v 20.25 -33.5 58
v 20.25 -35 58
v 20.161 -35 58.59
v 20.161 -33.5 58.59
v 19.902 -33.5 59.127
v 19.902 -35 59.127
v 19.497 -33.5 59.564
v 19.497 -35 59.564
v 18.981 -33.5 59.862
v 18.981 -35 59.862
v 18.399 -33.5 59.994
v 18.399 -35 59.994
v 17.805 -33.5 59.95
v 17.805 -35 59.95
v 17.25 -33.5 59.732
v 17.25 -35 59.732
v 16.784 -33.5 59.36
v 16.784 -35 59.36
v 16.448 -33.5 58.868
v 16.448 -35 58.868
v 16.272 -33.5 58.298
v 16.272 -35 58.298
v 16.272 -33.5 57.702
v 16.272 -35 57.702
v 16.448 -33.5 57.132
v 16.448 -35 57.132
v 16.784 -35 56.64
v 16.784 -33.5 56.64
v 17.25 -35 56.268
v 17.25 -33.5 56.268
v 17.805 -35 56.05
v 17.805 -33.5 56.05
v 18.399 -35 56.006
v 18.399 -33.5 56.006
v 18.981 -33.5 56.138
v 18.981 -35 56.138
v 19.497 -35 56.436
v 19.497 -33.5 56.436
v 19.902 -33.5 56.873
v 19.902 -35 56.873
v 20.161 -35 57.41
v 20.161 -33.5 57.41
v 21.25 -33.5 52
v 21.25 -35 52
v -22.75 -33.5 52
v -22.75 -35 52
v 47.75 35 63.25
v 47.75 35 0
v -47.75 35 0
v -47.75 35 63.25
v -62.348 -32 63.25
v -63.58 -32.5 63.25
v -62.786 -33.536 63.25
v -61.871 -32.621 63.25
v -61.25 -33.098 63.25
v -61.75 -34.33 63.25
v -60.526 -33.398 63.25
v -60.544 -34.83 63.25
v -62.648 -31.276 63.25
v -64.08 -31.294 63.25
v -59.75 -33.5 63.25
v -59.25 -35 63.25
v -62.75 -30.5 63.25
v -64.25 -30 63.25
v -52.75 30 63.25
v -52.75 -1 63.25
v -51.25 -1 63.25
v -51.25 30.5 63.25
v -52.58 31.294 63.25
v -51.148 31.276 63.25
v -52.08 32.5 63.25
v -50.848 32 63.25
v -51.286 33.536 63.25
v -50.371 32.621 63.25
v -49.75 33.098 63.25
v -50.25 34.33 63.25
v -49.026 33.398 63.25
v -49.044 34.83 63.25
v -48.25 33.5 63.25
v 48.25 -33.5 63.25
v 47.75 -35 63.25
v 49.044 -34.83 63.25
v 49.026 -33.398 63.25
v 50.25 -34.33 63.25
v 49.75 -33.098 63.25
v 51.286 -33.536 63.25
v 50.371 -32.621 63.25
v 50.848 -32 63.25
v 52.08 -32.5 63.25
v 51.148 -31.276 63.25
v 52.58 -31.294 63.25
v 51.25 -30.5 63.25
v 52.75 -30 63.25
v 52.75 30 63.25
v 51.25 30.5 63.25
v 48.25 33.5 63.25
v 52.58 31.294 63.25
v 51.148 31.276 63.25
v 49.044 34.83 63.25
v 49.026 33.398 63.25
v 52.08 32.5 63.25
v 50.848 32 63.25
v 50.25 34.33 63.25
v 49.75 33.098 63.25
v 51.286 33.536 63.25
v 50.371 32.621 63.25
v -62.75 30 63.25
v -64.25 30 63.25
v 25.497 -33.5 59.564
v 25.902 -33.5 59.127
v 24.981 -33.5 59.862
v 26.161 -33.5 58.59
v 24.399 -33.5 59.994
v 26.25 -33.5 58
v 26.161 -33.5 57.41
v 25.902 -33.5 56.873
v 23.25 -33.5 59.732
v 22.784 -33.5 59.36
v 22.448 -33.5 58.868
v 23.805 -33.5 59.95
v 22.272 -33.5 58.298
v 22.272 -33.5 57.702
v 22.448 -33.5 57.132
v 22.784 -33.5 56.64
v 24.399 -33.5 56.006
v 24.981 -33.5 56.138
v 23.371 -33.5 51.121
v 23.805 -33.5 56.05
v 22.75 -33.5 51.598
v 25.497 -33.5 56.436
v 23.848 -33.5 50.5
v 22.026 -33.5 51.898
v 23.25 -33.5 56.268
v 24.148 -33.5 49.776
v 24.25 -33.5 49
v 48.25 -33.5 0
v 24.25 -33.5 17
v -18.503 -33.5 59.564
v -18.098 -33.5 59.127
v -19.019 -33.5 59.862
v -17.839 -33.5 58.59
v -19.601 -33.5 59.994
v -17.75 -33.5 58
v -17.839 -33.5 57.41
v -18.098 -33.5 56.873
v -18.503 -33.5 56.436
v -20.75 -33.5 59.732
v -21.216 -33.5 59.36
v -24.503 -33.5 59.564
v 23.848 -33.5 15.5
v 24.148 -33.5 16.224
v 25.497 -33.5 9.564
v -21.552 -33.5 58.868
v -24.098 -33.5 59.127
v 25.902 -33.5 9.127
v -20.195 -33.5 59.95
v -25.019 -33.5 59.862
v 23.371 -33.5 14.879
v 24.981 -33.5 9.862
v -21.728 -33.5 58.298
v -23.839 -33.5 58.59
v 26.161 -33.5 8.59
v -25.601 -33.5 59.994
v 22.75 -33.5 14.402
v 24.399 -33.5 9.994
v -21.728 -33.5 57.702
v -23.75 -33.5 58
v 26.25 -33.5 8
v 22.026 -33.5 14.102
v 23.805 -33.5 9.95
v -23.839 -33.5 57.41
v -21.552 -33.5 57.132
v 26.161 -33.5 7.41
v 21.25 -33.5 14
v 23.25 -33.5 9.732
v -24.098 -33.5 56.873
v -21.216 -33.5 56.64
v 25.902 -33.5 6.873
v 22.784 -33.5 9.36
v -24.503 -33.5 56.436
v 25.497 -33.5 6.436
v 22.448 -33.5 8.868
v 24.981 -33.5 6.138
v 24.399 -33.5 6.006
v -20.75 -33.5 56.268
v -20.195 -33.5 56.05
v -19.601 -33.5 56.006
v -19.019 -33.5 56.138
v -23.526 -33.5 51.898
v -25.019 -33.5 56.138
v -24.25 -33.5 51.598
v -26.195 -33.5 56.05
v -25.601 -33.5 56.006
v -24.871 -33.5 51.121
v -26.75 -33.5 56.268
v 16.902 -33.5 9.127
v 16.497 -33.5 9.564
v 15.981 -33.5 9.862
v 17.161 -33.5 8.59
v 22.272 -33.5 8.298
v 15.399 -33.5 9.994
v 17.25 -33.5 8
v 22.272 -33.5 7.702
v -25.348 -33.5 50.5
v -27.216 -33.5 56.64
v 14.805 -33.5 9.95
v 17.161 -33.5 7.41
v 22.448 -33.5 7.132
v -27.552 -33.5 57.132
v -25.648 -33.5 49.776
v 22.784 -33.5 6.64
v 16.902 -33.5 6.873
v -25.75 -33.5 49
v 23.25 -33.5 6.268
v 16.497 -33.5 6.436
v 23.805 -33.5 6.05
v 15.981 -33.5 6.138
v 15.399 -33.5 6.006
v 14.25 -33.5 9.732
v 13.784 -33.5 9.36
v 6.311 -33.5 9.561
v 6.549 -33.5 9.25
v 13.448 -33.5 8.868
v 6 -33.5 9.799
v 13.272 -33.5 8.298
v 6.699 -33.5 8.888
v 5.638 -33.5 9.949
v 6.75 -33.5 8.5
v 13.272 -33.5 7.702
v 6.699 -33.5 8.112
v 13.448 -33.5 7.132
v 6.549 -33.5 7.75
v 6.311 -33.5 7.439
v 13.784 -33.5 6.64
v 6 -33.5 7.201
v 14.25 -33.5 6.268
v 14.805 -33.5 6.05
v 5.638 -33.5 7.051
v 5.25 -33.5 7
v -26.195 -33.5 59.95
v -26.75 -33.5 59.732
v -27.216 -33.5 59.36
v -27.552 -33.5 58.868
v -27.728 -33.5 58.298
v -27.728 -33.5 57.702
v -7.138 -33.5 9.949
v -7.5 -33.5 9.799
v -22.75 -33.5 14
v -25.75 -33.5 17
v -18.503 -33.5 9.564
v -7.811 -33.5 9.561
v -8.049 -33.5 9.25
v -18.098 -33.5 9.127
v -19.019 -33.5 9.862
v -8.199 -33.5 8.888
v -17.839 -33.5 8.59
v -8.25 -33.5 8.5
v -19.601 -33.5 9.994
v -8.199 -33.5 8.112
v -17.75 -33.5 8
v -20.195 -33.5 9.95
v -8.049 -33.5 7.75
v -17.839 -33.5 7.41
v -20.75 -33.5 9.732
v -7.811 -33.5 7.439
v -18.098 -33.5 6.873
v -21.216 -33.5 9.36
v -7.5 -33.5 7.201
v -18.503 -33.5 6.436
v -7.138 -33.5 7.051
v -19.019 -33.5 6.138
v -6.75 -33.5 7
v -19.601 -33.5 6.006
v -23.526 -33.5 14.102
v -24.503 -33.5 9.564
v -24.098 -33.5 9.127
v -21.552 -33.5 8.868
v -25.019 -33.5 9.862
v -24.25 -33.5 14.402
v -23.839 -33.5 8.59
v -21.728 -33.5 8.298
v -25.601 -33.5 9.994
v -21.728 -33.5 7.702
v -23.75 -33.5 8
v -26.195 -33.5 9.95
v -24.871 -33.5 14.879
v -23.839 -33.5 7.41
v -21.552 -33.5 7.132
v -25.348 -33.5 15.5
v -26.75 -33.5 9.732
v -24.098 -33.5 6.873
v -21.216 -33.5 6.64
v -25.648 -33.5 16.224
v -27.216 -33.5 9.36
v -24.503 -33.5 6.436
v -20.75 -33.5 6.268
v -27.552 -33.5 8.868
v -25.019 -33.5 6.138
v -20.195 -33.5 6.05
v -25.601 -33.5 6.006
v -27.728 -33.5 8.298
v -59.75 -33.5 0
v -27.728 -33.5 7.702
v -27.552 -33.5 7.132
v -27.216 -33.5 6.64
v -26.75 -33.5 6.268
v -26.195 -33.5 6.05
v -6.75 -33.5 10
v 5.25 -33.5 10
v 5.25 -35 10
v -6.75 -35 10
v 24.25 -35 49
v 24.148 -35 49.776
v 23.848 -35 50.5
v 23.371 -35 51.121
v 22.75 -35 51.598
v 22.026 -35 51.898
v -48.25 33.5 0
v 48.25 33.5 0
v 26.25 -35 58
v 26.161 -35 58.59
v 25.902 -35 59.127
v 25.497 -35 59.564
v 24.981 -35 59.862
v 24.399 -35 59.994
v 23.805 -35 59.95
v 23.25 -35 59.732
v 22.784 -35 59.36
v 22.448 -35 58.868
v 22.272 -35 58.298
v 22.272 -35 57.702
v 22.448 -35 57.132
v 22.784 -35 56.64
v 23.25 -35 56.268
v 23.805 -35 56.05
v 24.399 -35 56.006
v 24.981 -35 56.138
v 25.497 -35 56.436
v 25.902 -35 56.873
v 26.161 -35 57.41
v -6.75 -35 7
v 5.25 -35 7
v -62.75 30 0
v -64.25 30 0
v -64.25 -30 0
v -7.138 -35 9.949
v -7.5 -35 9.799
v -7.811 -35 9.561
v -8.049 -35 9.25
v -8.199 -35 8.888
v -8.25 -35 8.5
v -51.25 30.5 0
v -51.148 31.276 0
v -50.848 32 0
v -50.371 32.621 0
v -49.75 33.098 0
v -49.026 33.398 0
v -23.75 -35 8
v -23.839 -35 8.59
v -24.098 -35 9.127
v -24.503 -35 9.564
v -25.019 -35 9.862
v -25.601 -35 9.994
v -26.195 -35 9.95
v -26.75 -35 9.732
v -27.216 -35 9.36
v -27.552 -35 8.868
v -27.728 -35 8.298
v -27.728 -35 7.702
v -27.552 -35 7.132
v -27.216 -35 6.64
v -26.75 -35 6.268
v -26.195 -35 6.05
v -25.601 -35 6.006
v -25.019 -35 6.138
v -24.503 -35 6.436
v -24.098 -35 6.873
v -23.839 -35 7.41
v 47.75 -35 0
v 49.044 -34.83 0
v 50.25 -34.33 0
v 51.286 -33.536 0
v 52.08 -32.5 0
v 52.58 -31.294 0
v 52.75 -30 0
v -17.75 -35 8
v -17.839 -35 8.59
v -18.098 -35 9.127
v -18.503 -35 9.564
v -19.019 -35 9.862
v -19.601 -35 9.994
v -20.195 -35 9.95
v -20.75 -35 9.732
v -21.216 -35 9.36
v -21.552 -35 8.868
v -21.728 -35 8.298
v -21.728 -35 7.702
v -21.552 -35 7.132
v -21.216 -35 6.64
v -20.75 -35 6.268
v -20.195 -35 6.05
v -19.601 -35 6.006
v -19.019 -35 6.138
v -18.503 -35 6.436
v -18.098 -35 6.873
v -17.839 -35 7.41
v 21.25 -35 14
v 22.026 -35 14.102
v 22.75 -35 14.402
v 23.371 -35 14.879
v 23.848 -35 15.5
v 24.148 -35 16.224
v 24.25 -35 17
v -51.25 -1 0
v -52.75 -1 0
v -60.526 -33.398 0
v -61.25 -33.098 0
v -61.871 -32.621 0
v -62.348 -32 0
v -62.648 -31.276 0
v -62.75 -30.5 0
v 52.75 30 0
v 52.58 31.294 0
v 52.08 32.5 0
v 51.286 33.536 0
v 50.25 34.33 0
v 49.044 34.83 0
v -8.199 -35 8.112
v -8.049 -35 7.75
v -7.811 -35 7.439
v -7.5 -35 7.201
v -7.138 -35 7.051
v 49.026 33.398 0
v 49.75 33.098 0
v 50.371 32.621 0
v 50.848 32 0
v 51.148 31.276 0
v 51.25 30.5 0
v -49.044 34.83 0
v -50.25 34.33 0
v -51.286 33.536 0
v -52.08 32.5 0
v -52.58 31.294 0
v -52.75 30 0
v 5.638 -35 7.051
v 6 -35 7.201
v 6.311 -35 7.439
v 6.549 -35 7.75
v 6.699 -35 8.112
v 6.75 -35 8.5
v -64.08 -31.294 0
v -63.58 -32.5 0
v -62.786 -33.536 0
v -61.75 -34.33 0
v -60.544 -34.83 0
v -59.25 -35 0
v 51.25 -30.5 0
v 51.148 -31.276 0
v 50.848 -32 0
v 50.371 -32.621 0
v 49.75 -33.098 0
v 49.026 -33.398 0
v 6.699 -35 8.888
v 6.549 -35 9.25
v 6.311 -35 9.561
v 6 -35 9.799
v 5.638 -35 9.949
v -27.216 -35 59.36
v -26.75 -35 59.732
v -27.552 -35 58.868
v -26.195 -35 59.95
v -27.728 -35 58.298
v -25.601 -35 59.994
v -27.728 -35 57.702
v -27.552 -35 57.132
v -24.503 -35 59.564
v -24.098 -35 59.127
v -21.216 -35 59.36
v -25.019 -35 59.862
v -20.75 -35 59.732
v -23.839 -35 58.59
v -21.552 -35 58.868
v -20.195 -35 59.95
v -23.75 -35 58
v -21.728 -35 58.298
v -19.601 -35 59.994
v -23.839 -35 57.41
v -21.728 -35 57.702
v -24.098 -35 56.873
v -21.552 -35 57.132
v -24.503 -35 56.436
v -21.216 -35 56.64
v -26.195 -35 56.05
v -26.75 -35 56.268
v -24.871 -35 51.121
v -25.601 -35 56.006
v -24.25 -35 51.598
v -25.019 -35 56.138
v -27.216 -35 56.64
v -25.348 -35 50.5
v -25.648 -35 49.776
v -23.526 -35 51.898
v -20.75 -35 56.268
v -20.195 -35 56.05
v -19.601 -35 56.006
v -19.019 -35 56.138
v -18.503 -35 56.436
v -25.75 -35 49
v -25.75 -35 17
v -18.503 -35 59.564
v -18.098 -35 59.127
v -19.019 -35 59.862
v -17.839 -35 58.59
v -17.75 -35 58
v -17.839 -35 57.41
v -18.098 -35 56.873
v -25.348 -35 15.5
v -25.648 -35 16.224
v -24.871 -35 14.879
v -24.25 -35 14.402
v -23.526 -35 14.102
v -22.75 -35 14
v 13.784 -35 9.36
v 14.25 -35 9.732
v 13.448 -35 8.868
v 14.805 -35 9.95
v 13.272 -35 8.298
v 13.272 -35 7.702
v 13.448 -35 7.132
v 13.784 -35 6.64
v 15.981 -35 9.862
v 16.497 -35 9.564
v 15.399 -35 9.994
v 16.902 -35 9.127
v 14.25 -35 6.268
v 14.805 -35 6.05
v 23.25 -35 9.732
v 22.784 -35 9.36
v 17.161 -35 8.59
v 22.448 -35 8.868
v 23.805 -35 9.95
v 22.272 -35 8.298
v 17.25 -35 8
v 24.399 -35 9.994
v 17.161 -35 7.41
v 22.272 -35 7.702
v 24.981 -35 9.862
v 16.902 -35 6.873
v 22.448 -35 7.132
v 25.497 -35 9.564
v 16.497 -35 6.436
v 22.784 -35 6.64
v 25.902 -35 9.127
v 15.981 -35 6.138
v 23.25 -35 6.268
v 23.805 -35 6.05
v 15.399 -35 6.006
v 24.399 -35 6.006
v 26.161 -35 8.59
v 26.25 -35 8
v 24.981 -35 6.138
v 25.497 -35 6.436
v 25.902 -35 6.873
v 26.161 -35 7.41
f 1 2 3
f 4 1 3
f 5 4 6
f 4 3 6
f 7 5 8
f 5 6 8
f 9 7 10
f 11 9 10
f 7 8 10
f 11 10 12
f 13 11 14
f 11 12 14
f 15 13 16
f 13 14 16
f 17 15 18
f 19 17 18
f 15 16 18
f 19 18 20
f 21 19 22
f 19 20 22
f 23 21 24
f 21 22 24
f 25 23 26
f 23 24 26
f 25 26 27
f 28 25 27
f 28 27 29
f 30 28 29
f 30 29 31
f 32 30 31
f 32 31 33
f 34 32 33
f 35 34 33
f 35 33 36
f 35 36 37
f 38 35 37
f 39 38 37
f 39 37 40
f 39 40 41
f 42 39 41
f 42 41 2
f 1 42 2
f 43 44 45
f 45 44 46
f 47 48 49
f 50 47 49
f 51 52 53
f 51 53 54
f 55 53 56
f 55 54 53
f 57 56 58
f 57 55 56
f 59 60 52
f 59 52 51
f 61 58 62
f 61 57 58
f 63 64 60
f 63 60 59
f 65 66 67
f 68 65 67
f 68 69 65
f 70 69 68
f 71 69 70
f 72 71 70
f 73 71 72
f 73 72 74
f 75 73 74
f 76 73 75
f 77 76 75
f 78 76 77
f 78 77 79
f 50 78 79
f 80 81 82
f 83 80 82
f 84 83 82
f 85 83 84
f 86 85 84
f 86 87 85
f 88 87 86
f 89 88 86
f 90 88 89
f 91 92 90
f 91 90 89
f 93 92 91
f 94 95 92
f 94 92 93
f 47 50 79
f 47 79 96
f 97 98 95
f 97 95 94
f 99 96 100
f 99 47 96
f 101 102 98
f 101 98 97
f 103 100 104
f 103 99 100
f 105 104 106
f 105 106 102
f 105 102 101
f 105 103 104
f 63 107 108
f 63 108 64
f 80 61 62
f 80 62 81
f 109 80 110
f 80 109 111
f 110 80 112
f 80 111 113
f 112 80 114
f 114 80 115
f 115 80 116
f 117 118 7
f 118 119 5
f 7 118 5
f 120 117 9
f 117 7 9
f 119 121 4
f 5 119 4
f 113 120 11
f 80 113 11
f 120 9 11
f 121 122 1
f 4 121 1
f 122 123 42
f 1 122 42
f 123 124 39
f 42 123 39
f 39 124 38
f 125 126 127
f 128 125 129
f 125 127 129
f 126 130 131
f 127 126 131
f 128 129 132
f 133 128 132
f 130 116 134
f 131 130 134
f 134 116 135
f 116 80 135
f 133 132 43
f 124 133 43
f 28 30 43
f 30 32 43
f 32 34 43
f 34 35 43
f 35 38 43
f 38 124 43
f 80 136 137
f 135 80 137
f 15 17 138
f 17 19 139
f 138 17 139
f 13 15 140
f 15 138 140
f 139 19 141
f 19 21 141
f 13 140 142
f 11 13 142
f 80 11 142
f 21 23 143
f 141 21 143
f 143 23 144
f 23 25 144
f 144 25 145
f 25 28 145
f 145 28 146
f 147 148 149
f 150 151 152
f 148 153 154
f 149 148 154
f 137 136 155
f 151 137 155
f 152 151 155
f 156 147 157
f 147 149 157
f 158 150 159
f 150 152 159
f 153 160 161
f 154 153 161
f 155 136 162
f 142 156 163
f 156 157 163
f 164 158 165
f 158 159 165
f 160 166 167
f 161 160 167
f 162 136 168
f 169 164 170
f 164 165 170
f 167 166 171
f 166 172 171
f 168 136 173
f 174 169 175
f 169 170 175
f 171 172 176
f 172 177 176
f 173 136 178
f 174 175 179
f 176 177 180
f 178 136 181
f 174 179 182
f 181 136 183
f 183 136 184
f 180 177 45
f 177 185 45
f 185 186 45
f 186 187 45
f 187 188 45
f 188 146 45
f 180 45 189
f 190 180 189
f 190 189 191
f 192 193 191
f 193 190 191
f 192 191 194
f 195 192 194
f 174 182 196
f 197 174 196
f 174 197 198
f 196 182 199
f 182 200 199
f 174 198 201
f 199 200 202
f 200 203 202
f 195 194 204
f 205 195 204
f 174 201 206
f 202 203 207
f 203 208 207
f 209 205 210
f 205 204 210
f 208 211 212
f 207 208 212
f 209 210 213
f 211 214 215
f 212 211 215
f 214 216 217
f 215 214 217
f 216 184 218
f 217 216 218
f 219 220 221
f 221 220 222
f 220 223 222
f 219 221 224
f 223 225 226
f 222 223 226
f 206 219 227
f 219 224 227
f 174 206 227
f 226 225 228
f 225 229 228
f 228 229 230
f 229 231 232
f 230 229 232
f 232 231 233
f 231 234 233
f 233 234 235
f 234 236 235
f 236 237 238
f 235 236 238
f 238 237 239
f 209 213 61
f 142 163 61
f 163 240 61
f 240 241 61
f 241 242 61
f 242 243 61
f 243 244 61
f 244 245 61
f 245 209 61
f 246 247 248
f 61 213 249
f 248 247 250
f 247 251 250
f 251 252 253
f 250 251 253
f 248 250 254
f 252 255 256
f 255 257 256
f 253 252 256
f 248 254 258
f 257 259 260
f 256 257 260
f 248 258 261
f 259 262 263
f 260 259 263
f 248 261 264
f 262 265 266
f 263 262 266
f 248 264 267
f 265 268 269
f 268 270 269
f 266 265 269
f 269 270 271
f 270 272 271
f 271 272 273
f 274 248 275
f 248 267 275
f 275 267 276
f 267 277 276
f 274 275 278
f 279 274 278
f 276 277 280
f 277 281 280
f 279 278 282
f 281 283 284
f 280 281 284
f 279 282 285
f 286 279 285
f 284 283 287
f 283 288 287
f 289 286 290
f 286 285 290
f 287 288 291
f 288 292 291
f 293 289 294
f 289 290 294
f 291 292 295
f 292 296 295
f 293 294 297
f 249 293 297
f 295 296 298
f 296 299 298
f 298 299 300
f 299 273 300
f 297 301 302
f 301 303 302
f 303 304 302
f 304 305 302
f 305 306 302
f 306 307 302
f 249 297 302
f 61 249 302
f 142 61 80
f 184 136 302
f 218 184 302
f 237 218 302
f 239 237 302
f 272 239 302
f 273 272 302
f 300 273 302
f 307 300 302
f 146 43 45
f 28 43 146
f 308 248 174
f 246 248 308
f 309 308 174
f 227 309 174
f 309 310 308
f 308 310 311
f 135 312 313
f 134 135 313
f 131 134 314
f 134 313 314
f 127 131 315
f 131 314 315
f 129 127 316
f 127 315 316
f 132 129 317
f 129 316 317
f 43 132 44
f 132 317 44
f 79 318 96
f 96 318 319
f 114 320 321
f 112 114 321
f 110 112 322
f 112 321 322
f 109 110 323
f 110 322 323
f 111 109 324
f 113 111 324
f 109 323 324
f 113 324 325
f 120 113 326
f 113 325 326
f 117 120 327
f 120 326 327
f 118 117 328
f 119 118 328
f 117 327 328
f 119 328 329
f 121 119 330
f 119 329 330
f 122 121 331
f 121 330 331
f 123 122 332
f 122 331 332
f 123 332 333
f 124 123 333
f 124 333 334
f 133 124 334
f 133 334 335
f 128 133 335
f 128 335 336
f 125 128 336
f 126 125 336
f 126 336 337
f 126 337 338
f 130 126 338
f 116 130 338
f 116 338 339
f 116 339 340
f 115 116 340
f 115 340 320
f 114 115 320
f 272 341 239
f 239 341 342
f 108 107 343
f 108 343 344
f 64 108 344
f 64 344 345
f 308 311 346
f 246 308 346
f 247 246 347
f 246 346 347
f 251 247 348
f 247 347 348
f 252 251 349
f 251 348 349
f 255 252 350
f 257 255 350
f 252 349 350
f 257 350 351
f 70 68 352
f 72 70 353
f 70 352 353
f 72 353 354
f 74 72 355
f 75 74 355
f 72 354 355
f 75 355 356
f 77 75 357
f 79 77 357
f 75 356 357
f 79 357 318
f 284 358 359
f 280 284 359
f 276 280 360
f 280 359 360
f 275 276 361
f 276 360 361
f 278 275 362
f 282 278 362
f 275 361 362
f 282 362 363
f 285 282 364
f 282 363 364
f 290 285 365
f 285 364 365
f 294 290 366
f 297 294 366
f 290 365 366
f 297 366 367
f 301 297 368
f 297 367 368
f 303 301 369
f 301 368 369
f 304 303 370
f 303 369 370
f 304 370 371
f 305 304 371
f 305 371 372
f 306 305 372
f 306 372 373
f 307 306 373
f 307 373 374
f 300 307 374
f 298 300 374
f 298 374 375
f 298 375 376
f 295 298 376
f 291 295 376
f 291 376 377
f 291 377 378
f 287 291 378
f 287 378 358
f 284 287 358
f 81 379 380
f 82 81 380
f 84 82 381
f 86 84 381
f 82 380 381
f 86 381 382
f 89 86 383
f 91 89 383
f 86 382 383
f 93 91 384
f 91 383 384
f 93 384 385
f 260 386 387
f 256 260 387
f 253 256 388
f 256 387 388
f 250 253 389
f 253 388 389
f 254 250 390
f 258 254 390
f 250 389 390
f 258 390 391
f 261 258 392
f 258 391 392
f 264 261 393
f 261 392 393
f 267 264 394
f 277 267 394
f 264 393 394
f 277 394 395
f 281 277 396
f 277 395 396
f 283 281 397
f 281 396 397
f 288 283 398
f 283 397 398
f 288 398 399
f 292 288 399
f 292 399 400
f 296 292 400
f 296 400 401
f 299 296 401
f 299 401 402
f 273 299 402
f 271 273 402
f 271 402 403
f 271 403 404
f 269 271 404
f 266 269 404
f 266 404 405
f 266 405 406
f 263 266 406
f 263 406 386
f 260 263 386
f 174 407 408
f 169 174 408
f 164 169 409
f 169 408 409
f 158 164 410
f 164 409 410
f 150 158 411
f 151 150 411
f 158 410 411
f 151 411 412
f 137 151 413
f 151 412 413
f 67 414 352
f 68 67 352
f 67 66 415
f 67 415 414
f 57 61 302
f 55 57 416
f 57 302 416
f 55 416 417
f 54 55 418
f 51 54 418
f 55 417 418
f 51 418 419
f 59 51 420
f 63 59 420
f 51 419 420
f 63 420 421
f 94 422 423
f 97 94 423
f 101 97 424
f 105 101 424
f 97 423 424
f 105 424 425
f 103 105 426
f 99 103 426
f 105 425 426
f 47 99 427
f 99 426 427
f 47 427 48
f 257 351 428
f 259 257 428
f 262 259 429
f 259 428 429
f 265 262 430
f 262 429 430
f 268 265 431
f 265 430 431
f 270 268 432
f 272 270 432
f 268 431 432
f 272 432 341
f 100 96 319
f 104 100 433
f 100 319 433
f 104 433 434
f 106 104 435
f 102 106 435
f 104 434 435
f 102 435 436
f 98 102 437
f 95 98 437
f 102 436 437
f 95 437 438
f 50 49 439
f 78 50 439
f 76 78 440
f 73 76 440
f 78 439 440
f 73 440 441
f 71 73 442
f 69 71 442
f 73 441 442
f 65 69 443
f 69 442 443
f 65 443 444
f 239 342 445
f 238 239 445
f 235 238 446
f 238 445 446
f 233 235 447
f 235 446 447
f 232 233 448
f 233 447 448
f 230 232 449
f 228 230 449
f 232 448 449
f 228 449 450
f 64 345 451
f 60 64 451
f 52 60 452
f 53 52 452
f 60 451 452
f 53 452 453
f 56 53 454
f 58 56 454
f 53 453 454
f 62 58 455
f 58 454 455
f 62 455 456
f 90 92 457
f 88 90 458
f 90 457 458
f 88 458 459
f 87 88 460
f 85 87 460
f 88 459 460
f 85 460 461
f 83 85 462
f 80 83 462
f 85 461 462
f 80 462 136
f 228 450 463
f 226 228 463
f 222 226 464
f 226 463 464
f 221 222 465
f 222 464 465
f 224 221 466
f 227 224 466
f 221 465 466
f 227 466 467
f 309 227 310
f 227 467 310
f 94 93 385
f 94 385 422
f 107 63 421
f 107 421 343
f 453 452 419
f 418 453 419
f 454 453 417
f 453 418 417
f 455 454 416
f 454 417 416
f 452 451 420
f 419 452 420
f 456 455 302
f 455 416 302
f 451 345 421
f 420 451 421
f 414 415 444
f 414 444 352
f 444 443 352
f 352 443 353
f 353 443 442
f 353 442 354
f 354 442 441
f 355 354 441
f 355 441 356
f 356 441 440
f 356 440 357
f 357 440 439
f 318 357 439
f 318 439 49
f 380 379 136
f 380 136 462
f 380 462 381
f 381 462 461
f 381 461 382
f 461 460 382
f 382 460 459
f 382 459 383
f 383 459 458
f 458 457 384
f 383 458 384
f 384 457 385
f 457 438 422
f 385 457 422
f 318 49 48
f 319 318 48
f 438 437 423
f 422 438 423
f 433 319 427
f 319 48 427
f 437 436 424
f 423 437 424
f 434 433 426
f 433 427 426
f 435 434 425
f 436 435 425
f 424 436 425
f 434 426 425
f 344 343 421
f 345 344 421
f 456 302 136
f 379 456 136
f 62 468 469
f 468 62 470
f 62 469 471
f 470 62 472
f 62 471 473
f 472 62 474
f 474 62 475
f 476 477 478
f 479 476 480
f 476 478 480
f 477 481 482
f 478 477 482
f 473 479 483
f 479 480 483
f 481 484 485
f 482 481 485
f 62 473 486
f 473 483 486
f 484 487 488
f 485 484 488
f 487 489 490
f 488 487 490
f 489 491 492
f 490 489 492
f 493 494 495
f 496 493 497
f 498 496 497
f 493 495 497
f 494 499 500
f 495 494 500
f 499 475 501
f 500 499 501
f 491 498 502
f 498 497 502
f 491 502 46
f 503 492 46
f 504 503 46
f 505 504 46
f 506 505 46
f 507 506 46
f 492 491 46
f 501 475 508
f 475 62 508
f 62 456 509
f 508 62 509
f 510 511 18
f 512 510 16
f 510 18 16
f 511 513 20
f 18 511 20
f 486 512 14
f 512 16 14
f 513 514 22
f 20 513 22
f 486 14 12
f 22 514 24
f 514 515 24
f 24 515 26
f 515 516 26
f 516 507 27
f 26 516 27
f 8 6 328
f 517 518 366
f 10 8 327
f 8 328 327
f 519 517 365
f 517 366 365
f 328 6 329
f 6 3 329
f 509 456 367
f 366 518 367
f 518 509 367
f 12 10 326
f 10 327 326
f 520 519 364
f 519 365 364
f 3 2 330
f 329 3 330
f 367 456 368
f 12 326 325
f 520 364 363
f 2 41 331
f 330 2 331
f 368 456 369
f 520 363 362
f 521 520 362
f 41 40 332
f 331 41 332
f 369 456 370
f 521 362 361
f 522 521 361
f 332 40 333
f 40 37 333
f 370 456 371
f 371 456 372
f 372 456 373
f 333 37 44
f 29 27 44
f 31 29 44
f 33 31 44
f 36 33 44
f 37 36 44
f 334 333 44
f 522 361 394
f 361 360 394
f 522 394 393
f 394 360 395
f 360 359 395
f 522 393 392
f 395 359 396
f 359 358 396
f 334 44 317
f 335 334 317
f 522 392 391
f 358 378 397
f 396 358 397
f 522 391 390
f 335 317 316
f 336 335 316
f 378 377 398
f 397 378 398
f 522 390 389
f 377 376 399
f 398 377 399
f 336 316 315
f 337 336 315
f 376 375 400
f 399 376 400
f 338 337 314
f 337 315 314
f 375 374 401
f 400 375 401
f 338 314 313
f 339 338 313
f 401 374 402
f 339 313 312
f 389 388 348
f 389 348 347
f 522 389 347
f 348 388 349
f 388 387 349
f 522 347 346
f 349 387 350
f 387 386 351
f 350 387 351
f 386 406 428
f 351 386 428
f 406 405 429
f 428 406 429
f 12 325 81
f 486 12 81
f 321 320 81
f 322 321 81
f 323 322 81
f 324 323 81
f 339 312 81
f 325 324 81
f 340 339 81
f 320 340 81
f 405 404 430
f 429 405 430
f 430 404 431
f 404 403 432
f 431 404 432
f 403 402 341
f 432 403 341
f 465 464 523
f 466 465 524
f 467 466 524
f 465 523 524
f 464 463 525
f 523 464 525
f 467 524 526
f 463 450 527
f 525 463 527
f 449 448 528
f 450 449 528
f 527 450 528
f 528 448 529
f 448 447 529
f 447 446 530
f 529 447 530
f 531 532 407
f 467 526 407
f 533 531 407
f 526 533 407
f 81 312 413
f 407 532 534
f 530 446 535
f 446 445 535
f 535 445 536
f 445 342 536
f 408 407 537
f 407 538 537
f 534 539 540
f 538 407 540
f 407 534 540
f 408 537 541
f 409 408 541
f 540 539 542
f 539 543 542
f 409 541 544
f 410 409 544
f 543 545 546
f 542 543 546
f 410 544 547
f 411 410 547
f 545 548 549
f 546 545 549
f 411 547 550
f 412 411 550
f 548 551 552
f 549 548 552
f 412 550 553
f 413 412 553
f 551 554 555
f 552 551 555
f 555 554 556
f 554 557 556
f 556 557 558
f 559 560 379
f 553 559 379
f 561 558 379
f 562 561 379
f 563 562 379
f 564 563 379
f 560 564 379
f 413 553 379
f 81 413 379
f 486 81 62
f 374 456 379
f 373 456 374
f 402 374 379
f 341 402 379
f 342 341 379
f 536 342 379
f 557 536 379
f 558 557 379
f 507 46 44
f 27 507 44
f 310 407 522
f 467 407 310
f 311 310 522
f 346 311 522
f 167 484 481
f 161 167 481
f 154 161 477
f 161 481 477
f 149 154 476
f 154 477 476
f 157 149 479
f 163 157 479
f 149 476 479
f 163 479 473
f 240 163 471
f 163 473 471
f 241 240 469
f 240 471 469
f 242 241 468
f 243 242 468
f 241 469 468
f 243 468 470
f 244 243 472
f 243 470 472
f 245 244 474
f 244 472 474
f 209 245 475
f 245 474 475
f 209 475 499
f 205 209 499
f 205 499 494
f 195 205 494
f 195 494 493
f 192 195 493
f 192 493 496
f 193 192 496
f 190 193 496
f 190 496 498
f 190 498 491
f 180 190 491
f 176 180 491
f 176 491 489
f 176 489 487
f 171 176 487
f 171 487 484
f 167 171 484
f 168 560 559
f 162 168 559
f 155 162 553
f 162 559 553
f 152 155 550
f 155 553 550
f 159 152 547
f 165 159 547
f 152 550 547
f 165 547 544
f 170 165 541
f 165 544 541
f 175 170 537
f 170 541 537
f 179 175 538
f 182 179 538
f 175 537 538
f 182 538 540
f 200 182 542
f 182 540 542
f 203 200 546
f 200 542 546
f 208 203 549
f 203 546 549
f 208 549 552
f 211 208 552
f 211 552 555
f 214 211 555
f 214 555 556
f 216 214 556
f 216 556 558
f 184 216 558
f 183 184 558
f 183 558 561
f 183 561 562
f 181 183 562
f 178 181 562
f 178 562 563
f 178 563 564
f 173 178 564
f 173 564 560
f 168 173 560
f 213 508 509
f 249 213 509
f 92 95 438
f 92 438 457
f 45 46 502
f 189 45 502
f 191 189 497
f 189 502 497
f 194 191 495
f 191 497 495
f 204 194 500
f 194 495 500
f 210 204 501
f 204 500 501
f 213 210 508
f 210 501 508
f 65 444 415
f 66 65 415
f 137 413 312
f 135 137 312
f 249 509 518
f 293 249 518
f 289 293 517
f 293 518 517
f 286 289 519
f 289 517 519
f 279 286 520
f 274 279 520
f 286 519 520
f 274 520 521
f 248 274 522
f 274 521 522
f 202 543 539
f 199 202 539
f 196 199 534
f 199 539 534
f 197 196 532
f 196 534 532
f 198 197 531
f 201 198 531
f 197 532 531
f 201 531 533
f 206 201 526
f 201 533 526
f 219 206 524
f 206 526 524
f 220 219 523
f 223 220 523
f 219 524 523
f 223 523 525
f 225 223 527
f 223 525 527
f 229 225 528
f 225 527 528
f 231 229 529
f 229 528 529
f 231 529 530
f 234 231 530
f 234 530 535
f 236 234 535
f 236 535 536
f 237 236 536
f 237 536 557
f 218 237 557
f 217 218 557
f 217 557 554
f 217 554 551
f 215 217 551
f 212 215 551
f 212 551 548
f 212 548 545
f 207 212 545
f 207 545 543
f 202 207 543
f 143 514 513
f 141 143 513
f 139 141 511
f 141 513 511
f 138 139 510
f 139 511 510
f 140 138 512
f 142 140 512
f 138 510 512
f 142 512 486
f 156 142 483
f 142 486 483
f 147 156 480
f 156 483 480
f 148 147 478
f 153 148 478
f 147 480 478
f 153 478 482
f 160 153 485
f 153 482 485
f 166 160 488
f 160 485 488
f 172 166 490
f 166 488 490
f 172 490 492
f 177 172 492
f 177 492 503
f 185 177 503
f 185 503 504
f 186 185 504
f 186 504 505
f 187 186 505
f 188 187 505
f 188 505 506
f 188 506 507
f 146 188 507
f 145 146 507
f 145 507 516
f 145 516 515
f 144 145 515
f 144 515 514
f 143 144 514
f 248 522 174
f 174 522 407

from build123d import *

# Parameters (mm, degrees)
F1_DEPTH = 63.25
F2_R     = 2
F3_DEPTH = 25


# Not quite as in the source:
# - a feature names something its author has since deleted; it is built from what else it names


with BuildPart() as f1:
    # F0 (on Top) → F1 (new body)
    with BuildSketch(Plane.XY):
        with BuildLine():
            Line((-62.75, -30.5), (-62.75, 30))
            Line((-62.75, 30), (-64.25, 30))
            Line((-64.25, 30), (-64.25, -30))
            ThreePointArc((-64.25, -30), (-62.7855339059, -33.5355339059), (-59.25, -35))
            Line((-59.25, -35), (47.75, -35))
            ThreePointArc((47.75, -35), (51.2855339059, -33.5355339059), (52.75, -30))
            Line((52.75, -30), (52.75, 30))
            ThreePointArc((52.75, 30), (51.2855339059, 33.5355339059), (47.75, 35))
            Line((47.75, 35), (-47.75, 35))
            ThreePointArc((-47.75, 35), (-51.2855339059, 33.5355339059), (-52.75, 30))
            Line((-52.75, 30), (-52.75, -1))
            Line((-52.75, -1), (-51.25, -1))
            Line((-51.25, -1), (-51.25, 30.5))
            ThreePointArc((-51.25, 30.5), (-50.3713203436, 32.6213203436), (-48.25, 33.5))
            Line((-48.25, 33.5), (48.25, 33.5))
            ThreePointArc((48.25, 33.5), (50.3713203436, 32.6213203436), (51.25, 30.5))
            Line((51.25, 30.5), (51.25, -30.5))
            ThreePointArc((51.25, -30.5), (50.3713203436, -32.6213203436), (48.25, -33.5))
            Line((48.25, -33.5), (-59.75, -33.5))
            ThreePointArc((-59.75, -33.5), (-61.8713203436, -32.6213203436), (-62.75, -30.5))
        make_face()
    extrude(amount=F1_DEPTH)

    # F2 (on face) → F3 (cut)
    with BuildSketch(Plane.XZ.offset(35)):
        with BuildLine():
            Line((21.25, 52), (-22.75, 52))
            ThreePointArc((-22.75, 52), (-24.8713203436, 51.1213203436), (-25.75, 49))
            Line((-25.75, 49), (-25.75, 17))
            ThreePointArc((-25.75, 17), (-24.8713203436, 14.8786796564), (-22.75, 14))
            Line((-22.75, 14), (21.25, 14))
            ThreePointArc((21.25, 14), (23.3713203436, 14.8786796564), (24.25, 17))
            Line((24.25, 17), (24.25, 49))
            ThreePointArc((24.25, 49), (23.3713203436, 51.1213203436), (21.25, 52))
        make_face()
        with Locations((-25.75, 58)):
            Circle(F2_R)
        with Locations((24.25, 58)):
            Circle(F2_R)
        with Locations((24.25, 8)):
            Circle(F2_R)
        with Locations((-25.75, 8)):
            Circle(F2_R)
        with BuildLine():
            ThreePointArc((-8.25, 8.5), (-7.8106601718, 7.4393398282), (-6.75, 7))
            Line((-6.75, 7), (5.25, 7))
            ThreePointArc((5.25, 7), (6.3106601718, 7.4393398282), (6.75, 8.5))
            ThreePointArc((6.75, 8.5), (6.3106601718, 9.5606601718), (5.25, 10))
            Line((5.25, 10), (-6.75, 10))
            ThreePointArc((-6.75, 10), (-7.8106601718, 9.5606601718), (-8.25, 8.5))
        make_face()
        with Locations((-19.75, 8)):
            Circle(F2_R)
        with Locations((-19.75, 58)):
            Circle(F2_R)
        with Locations((18.25, 58)):
            Circle(F2_R)
        with Locations((15.25, 8)):
            Circle(F2_R)
    extrude(amount=-F3_DEPTH, mode=Mode.SUBTRACT)


solid = f1.part
